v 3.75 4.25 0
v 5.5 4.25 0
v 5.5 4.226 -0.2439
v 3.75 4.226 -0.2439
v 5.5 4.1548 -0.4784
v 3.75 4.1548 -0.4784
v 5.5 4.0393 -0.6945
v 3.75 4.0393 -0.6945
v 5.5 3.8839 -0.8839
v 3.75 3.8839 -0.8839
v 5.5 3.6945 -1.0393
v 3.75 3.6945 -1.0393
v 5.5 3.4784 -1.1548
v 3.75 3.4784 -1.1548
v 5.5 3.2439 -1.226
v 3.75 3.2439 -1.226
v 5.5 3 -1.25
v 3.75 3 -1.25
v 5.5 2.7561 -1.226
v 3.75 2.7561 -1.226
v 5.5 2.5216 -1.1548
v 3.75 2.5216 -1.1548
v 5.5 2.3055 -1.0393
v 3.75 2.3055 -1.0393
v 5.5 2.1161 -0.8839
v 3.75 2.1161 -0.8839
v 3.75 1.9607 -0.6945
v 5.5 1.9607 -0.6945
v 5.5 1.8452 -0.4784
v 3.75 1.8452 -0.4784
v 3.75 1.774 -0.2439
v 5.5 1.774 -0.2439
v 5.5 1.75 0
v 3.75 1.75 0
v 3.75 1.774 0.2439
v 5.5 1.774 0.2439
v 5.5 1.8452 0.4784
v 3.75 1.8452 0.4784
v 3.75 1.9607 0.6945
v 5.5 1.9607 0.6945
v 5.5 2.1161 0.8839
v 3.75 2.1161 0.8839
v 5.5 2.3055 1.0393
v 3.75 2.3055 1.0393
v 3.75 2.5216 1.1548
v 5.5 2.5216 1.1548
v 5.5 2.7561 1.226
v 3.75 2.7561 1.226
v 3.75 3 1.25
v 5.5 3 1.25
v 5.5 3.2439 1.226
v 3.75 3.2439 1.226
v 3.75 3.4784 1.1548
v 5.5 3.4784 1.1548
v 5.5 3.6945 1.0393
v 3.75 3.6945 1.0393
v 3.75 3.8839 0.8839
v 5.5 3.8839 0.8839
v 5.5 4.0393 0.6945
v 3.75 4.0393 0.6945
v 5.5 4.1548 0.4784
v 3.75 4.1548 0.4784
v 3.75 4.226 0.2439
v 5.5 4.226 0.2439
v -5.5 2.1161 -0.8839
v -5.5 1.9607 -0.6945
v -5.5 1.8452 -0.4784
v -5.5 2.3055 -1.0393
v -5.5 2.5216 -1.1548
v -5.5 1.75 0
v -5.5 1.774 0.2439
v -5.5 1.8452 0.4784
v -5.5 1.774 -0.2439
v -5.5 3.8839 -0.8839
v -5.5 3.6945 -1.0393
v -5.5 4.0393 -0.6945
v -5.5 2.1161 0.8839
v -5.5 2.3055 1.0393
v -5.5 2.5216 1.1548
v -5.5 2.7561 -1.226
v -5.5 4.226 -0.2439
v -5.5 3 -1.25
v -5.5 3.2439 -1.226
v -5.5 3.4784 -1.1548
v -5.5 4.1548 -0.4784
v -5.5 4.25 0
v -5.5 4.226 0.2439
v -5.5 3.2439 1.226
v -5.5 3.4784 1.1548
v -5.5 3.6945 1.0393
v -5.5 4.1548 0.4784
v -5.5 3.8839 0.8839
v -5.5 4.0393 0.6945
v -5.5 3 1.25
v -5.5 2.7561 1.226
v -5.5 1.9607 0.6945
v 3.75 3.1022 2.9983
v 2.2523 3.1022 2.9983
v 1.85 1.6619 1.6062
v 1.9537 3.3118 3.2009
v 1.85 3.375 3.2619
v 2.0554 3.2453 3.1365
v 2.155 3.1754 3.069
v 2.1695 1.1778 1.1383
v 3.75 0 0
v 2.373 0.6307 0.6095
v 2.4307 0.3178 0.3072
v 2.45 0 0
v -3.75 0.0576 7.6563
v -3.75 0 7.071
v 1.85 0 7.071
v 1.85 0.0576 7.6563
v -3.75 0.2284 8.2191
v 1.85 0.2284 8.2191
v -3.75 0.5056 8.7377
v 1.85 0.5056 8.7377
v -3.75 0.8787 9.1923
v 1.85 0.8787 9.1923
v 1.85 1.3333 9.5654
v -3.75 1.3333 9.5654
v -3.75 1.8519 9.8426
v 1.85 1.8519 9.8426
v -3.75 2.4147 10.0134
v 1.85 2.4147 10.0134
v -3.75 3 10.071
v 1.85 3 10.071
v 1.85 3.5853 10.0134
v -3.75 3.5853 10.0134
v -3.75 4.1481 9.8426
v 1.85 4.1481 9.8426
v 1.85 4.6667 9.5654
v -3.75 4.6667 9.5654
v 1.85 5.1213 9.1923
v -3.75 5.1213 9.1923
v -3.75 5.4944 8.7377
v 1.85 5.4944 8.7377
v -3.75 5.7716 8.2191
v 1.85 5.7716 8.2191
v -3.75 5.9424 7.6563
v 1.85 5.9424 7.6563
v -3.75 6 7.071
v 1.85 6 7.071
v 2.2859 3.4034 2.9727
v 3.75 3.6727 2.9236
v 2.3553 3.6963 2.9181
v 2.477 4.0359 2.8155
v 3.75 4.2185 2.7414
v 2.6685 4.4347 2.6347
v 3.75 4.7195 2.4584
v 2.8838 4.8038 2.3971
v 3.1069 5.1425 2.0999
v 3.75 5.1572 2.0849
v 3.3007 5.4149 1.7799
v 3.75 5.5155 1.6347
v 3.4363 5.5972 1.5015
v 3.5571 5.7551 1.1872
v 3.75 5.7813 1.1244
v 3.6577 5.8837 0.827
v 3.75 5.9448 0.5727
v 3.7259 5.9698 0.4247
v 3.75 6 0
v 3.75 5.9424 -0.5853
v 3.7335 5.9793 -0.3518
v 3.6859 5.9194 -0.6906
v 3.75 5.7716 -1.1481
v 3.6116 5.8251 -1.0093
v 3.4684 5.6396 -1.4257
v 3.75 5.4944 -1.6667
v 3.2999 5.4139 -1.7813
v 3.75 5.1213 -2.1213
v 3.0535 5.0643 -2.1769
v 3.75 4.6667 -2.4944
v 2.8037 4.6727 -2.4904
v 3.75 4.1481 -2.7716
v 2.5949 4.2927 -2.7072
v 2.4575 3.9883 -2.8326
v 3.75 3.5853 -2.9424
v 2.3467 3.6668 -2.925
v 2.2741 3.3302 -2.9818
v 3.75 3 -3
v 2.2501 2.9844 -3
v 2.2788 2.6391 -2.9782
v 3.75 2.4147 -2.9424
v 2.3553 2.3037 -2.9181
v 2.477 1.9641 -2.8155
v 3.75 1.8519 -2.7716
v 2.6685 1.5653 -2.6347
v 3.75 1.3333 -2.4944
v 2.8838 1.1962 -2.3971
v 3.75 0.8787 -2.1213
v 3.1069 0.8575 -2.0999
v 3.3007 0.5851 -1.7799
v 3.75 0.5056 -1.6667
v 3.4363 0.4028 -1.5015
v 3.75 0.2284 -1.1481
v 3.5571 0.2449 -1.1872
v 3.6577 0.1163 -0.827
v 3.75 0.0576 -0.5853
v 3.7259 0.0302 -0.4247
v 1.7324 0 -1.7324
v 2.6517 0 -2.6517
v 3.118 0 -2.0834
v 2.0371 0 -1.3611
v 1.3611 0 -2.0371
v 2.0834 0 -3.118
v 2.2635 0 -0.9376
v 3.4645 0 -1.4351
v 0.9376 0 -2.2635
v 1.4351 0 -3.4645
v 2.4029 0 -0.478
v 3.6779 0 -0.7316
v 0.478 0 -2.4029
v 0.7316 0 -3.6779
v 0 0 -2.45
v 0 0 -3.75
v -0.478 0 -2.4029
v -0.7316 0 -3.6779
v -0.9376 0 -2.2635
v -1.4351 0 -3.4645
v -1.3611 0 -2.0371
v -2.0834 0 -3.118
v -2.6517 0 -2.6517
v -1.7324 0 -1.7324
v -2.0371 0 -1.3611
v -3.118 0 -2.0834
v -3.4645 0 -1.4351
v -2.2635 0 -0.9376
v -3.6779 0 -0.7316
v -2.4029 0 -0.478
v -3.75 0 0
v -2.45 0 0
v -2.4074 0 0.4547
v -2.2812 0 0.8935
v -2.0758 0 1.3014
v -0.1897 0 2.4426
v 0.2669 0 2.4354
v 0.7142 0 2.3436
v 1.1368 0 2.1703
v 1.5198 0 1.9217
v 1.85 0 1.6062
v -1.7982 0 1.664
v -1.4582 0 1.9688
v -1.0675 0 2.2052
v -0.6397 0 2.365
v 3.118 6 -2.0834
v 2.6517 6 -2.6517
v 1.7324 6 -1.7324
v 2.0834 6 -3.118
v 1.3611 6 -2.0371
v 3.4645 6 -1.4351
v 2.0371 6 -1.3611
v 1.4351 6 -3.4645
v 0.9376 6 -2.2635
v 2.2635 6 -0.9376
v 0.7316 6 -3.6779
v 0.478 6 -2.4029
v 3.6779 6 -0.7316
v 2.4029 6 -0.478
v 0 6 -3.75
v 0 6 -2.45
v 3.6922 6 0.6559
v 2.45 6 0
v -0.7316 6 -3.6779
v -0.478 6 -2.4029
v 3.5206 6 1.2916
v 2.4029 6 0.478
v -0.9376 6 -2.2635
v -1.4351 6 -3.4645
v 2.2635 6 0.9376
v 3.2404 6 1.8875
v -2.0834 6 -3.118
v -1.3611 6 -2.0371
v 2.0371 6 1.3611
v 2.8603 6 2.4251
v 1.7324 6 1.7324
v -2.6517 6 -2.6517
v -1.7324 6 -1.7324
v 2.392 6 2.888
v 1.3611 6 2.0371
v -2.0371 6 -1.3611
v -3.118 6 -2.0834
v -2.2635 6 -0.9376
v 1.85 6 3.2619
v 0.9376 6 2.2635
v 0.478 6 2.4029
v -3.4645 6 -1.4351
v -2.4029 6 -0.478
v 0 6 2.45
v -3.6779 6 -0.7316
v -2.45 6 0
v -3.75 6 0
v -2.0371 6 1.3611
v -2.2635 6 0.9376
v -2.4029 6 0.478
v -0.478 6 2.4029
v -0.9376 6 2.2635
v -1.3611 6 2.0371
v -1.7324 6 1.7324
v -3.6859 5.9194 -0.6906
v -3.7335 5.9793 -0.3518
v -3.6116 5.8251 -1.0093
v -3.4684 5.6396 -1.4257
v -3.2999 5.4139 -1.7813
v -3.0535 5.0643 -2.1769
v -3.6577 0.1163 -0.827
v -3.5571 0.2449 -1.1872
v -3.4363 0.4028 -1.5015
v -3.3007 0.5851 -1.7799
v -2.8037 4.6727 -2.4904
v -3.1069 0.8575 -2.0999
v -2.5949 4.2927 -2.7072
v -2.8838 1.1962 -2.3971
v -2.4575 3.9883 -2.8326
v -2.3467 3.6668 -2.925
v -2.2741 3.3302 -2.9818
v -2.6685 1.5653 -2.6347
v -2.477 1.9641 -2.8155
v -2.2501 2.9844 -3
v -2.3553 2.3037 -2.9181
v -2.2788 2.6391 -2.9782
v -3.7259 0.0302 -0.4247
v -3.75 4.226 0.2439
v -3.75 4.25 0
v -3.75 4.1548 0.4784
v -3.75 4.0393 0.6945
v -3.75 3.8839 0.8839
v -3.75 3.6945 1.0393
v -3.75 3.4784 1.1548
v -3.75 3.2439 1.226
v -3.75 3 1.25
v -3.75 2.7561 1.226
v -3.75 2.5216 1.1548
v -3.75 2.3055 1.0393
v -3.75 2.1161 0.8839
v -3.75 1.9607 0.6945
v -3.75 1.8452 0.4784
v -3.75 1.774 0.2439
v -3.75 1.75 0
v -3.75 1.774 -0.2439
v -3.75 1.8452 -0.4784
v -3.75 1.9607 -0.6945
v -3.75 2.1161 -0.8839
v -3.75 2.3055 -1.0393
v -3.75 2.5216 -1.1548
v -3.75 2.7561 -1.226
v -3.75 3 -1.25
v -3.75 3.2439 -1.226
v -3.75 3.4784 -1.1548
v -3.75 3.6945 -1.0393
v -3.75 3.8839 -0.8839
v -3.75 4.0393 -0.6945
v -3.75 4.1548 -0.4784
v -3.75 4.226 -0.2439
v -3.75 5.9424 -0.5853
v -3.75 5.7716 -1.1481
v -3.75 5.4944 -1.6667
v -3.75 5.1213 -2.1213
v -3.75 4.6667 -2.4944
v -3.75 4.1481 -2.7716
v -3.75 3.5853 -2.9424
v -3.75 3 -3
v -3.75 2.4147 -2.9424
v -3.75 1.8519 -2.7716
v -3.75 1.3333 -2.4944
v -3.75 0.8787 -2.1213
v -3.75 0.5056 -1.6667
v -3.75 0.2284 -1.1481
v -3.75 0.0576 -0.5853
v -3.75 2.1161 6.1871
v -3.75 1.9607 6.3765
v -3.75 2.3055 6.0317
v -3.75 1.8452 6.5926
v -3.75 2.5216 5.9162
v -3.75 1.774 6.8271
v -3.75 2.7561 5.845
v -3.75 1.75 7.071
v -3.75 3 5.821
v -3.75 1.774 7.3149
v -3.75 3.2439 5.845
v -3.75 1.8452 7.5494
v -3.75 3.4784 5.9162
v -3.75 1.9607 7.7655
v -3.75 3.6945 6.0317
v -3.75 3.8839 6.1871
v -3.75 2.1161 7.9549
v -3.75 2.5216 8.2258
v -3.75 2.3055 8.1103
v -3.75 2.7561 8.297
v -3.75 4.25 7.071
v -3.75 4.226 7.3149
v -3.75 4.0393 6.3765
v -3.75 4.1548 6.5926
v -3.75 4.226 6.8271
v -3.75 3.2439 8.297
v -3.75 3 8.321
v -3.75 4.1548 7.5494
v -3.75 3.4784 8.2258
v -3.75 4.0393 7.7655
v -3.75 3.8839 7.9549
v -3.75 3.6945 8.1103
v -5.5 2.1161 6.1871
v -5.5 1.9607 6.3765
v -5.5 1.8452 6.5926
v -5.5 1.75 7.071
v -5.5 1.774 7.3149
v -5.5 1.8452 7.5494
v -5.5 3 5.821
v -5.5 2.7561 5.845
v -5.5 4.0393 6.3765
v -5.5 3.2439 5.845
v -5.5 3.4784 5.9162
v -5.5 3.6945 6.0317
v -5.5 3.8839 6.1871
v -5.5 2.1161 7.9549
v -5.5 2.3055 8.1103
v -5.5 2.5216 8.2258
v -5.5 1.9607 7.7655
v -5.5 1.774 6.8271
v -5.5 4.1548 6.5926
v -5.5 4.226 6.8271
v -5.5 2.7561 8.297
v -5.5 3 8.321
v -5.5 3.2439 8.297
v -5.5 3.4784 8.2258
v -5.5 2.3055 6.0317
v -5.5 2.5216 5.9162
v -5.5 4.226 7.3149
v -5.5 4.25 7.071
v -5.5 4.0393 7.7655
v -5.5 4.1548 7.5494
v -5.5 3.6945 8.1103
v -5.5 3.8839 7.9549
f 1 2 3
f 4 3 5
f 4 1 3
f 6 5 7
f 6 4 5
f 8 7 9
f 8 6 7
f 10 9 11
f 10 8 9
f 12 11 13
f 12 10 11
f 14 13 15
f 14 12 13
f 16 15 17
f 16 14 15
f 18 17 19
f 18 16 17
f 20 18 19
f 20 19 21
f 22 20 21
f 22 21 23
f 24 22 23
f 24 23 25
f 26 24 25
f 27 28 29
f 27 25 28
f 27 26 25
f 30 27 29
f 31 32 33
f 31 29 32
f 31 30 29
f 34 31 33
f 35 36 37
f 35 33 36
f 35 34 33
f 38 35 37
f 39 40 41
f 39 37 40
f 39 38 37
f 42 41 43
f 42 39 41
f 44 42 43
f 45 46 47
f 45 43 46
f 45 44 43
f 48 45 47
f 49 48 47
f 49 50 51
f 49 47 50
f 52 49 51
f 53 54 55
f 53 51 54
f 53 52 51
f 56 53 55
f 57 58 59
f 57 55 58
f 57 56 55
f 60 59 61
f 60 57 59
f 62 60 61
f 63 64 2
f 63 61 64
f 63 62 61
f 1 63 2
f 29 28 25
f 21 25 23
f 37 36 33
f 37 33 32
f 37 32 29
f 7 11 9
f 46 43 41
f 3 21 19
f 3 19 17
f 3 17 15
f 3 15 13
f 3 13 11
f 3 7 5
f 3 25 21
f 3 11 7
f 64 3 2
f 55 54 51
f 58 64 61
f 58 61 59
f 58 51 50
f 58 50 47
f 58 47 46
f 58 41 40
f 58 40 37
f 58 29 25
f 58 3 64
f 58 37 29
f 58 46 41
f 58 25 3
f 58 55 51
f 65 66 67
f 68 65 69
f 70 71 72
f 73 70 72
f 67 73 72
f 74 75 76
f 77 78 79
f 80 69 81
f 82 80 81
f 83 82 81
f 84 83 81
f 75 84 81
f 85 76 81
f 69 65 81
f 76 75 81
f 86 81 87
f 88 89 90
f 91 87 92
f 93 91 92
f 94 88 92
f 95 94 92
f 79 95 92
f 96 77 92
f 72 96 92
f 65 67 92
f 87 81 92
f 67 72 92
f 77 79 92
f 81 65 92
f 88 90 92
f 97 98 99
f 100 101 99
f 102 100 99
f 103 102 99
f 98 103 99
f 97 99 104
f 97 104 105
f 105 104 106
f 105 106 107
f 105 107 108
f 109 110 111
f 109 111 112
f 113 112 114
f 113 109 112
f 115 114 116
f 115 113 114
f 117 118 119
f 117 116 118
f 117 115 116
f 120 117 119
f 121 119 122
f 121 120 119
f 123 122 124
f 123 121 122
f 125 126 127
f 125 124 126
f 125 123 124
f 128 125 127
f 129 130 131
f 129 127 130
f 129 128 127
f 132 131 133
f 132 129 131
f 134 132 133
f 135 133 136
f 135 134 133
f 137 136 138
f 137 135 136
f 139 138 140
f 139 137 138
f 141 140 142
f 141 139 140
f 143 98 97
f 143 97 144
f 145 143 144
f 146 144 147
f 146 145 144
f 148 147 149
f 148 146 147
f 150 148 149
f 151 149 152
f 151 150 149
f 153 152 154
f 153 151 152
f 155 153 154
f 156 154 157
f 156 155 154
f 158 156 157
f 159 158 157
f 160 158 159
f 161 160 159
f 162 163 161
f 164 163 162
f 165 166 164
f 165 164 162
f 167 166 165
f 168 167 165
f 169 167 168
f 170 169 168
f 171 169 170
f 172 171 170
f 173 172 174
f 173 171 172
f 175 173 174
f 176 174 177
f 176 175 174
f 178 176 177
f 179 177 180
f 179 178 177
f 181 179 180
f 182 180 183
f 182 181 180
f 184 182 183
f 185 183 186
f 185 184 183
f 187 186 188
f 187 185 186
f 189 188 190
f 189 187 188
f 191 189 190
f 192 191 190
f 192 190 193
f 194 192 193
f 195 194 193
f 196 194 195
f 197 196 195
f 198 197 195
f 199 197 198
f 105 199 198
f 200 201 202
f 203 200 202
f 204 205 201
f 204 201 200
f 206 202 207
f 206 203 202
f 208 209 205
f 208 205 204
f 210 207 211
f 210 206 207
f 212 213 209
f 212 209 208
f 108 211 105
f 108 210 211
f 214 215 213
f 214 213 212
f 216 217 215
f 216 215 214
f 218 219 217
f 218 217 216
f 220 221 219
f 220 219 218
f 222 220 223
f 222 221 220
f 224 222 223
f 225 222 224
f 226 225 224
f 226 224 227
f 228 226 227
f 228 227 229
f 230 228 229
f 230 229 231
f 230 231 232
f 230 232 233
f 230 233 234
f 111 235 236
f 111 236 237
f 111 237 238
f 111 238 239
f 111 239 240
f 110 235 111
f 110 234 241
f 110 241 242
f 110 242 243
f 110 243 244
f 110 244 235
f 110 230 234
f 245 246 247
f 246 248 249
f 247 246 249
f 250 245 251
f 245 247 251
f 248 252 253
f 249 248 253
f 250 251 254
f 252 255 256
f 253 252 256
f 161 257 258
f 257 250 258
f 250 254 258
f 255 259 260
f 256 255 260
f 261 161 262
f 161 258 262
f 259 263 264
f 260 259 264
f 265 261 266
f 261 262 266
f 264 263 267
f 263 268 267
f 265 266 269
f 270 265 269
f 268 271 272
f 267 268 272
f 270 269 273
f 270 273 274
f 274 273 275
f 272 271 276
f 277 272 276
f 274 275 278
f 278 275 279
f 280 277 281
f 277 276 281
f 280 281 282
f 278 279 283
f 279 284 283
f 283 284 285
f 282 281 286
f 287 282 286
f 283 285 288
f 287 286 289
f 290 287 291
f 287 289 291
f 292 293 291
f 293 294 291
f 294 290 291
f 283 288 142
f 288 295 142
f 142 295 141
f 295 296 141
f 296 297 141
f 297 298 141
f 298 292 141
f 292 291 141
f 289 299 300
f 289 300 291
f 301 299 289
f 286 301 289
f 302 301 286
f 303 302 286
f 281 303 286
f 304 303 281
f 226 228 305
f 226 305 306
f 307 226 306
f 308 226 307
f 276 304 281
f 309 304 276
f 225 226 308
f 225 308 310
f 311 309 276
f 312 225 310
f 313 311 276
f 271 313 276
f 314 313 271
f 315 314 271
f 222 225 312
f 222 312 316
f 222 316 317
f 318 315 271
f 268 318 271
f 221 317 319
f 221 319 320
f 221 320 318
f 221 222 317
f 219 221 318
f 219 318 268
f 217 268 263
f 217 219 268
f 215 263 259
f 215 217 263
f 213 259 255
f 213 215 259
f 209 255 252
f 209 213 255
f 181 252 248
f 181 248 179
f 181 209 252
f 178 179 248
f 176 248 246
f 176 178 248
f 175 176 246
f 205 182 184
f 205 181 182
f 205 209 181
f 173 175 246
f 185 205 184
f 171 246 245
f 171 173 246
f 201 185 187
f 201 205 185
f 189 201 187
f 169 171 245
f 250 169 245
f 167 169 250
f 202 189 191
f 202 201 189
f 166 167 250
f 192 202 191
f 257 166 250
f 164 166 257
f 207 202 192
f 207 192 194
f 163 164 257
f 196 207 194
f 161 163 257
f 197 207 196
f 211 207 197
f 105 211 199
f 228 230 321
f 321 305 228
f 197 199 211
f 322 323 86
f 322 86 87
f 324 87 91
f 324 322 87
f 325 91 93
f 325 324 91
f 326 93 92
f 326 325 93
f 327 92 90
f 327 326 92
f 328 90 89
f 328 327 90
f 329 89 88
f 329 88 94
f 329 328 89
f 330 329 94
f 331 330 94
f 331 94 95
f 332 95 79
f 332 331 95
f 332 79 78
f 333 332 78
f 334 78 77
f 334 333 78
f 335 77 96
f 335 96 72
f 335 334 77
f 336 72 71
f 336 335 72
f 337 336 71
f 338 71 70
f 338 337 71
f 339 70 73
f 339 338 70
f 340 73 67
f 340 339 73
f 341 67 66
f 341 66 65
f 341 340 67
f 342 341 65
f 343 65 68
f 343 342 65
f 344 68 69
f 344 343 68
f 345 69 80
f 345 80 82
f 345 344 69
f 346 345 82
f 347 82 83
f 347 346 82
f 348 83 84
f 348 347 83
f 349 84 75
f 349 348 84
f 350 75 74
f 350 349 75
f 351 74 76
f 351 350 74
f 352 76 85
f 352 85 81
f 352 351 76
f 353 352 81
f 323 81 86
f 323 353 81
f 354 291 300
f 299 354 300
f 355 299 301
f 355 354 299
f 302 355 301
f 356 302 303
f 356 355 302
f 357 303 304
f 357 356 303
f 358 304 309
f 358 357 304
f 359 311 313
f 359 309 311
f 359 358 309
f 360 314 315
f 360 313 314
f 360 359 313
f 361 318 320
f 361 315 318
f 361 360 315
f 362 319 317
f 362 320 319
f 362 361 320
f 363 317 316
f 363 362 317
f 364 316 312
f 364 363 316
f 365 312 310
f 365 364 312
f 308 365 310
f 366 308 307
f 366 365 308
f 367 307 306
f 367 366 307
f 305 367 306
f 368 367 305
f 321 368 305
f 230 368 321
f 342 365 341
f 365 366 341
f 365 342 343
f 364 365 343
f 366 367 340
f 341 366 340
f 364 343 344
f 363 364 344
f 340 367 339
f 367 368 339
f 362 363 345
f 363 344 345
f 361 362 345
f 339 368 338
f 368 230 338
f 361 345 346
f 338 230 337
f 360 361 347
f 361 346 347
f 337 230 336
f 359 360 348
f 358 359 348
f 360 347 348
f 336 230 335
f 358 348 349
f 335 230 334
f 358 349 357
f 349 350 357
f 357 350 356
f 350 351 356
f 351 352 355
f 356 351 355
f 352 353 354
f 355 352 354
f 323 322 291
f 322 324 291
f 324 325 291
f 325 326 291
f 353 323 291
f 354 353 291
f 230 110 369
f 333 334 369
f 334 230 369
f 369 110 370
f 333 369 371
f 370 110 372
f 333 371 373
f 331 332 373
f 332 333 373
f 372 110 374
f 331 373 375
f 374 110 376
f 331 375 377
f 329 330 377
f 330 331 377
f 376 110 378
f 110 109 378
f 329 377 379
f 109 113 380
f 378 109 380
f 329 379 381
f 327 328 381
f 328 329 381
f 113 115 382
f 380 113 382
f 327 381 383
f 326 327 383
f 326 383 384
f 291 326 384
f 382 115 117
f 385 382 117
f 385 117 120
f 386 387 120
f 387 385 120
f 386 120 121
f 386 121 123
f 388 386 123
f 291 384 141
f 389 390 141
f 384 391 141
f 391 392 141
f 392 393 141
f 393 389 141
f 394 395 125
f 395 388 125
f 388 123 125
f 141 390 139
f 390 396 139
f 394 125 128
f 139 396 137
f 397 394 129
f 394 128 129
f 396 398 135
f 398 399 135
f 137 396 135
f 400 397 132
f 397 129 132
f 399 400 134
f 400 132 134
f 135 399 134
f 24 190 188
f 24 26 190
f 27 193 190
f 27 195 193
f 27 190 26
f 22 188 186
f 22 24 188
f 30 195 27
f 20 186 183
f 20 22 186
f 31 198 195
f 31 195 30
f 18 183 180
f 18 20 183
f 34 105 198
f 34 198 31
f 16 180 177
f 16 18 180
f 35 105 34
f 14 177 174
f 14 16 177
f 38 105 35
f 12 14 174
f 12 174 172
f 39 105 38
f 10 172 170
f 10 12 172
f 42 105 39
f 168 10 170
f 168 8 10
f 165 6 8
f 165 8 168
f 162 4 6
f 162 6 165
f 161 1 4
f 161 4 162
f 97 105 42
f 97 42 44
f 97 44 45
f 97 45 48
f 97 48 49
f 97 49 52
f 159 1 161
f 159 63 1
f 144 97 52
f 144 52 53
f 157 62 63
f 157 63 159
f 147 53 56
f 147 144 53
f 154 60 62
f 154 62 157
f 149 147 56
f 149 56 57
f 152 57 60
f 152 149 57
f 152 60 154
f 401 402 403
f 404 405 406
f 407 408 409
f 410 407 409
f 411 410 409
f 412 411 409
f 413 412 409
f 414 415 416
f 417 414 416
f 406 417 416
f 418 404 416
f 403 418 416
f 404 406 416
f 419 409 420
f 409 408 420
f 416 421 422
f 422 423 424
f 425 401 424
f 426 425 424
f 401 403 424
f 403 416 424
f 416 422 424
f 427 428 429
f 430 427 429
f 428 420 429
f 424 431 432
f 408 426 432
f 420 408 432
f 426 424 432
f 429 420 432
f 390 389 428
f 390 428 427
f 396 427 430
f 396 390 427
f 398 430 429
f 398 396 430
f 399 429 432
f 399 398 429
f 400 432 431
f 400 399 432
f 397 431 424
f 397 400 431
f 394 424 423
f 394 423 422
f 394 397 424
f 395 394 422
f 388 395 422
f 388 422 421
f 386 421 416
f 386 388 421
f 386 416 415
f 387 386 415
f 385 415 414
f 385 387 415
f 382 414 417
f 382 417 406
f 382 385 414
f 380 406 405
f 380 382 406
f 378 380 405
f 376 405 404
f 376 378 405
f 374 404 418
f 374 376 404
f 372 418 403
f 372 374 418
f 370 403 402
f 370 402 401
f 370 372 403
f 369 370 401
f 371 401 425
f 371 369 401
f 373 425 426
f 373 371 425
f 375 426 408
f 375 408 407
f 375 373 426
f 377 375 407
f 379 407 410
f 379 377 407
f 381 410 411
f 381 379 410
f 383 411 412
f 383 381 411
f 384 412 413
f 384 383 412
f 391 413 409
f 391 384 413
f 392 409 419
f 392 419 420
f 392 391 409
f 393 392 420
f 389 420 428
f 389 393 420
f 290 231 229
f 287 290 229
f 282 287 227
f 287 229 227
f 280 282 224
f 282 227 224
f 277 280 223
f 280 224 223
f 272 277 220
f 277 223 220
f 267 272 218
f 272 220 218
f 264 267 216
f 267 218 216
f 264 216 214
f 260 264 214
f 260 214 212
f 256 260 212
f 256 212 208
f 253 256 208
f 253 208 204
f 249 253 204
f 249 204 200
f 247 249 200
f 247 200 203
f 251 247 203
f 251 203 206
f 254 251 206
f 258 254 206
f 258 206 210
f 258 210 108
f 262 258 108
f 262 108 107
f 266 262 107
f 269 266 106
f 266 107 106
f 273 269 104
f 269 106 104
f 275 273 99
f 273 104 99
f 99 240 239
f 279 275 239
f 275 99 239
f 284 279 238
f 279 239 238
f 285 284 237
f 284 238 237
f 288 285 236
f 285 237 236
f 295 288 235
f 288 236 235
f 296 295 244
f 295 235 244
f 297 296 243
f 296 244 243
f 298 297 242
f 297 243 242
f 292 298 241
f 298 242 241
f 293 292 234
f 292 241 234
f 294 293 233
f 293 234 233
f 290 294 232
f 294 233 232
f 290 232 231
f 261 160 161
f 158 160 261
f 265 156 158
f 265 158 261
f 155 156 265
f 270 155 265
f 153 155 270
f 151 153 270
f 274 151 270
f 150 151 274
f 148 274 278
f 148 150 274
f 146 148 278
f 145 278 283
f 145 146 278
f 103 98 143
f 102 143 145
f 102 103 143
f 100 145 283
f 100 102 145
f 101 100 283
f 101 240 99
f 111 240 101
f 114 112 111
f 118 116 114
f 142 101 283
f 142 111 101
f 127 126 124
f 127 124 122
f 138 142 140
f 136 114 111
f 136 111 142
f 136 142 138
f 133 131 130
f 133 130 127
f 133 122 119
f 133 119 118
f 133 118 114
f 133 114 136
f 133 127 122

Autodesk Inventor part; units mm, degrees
ref_plane "YZ Plane" through (0, 0, 0) normal (1, 0, 0) x (0, 1, 0)
ref_plane "XZ Plane" through (0, 0, 0) normal (0, 1, 0) x (-1, 0, 0)
ref_plane "XY Plane" through (0, 0, 0) normal (0, 0, 1) x (1, 0, 0)
sketch "Эскиз1" plane through (0, 0, 0) normal (0, 1, 0) x (-1, 0, 0)
  circle A0 centre (0, 0) radius 2.45
  circle A1 centre (0, 0) radius 3.75
  dimension "d0" = 4.9
  dimension "d1" = 7.5
extrude "Выдавливание1" add sketch "Эскиз1" along normal blind 6
sketch "Эскиз2" plane through (0, 0, 0) normal (1, 0, 0) x (0, 1, 0)
  circle A0 centre (3, 0) radius 1.25
  line L0 (0, -3.75) -> (0, 3.75) projected
  circle A1 centre (3, 0) radius 3
  circle A2 centre (3, 7.071) radius 1.25
  arc A3 (6, 7.071) -> (0, 7.071) centre (3, 7.071) ccw
  line L1 (3, 0) -> (3, 7.071) construction
  line L2 (6, 0) -> (6, 7.071)
  line L3 (0, 7.071) -> (0, 0)
  point P0 (0, 0)
  dimension "d7" = 6
  dimension "d4" = 2.5
  dimension "d12" = 2.5
  dimension "d13" = 6
  dimension "d14" = 7.071
extrude "Выдавливание3" add sketch "Эскиз2" along normal mid plane 7.5 contours A1
extrude "Выдавливание5" add sketch "Эскиз2" along normal blind 1.85 and the other way blind 3.75 contours L0 L3 A3 L2 A1
extrude "Выдавливание2" add sketch "Эскиз2" along normal mid plane 11 contours A0
extrude "Выдавливание4" cut sketch "Эскиз1" along normal blind 6 contours A0
extrude "Выдавливание7" add sketch "Эскиз2" along normal blind 3.6 and the other way blind 5.5 contours A2
sketch "Эскиз3" plane through (1.85, 0, 0) normal (1, 0, 0) x (0, 0, -1)
  circle A0 centre (-7.071, 3) radius 1.25 projected
  arc A1 (-7.071, 6) -> (-7.071, 0) centre (-7.071, 3) ccw projected
  arc A2 (-7.071, 0) -> (-7.071, 6) centre (-7.071, 3) ccw
  line L0 (-7.071, 0) -> (-3.2619, 0) projected
  line L1 (0, 0) -> (-3.2619, 0) projected
  line L2 (3.75, 0) -> (0, 0) projected
  line L3 (-4.9497, 5.1213) -> (0, 0)
  point P0 (-4.8786, 5.0478)
extrude "Выдавливание8" cut sketch "Эскиз3" along normal blind 3.75
properties part number "Кулак"
